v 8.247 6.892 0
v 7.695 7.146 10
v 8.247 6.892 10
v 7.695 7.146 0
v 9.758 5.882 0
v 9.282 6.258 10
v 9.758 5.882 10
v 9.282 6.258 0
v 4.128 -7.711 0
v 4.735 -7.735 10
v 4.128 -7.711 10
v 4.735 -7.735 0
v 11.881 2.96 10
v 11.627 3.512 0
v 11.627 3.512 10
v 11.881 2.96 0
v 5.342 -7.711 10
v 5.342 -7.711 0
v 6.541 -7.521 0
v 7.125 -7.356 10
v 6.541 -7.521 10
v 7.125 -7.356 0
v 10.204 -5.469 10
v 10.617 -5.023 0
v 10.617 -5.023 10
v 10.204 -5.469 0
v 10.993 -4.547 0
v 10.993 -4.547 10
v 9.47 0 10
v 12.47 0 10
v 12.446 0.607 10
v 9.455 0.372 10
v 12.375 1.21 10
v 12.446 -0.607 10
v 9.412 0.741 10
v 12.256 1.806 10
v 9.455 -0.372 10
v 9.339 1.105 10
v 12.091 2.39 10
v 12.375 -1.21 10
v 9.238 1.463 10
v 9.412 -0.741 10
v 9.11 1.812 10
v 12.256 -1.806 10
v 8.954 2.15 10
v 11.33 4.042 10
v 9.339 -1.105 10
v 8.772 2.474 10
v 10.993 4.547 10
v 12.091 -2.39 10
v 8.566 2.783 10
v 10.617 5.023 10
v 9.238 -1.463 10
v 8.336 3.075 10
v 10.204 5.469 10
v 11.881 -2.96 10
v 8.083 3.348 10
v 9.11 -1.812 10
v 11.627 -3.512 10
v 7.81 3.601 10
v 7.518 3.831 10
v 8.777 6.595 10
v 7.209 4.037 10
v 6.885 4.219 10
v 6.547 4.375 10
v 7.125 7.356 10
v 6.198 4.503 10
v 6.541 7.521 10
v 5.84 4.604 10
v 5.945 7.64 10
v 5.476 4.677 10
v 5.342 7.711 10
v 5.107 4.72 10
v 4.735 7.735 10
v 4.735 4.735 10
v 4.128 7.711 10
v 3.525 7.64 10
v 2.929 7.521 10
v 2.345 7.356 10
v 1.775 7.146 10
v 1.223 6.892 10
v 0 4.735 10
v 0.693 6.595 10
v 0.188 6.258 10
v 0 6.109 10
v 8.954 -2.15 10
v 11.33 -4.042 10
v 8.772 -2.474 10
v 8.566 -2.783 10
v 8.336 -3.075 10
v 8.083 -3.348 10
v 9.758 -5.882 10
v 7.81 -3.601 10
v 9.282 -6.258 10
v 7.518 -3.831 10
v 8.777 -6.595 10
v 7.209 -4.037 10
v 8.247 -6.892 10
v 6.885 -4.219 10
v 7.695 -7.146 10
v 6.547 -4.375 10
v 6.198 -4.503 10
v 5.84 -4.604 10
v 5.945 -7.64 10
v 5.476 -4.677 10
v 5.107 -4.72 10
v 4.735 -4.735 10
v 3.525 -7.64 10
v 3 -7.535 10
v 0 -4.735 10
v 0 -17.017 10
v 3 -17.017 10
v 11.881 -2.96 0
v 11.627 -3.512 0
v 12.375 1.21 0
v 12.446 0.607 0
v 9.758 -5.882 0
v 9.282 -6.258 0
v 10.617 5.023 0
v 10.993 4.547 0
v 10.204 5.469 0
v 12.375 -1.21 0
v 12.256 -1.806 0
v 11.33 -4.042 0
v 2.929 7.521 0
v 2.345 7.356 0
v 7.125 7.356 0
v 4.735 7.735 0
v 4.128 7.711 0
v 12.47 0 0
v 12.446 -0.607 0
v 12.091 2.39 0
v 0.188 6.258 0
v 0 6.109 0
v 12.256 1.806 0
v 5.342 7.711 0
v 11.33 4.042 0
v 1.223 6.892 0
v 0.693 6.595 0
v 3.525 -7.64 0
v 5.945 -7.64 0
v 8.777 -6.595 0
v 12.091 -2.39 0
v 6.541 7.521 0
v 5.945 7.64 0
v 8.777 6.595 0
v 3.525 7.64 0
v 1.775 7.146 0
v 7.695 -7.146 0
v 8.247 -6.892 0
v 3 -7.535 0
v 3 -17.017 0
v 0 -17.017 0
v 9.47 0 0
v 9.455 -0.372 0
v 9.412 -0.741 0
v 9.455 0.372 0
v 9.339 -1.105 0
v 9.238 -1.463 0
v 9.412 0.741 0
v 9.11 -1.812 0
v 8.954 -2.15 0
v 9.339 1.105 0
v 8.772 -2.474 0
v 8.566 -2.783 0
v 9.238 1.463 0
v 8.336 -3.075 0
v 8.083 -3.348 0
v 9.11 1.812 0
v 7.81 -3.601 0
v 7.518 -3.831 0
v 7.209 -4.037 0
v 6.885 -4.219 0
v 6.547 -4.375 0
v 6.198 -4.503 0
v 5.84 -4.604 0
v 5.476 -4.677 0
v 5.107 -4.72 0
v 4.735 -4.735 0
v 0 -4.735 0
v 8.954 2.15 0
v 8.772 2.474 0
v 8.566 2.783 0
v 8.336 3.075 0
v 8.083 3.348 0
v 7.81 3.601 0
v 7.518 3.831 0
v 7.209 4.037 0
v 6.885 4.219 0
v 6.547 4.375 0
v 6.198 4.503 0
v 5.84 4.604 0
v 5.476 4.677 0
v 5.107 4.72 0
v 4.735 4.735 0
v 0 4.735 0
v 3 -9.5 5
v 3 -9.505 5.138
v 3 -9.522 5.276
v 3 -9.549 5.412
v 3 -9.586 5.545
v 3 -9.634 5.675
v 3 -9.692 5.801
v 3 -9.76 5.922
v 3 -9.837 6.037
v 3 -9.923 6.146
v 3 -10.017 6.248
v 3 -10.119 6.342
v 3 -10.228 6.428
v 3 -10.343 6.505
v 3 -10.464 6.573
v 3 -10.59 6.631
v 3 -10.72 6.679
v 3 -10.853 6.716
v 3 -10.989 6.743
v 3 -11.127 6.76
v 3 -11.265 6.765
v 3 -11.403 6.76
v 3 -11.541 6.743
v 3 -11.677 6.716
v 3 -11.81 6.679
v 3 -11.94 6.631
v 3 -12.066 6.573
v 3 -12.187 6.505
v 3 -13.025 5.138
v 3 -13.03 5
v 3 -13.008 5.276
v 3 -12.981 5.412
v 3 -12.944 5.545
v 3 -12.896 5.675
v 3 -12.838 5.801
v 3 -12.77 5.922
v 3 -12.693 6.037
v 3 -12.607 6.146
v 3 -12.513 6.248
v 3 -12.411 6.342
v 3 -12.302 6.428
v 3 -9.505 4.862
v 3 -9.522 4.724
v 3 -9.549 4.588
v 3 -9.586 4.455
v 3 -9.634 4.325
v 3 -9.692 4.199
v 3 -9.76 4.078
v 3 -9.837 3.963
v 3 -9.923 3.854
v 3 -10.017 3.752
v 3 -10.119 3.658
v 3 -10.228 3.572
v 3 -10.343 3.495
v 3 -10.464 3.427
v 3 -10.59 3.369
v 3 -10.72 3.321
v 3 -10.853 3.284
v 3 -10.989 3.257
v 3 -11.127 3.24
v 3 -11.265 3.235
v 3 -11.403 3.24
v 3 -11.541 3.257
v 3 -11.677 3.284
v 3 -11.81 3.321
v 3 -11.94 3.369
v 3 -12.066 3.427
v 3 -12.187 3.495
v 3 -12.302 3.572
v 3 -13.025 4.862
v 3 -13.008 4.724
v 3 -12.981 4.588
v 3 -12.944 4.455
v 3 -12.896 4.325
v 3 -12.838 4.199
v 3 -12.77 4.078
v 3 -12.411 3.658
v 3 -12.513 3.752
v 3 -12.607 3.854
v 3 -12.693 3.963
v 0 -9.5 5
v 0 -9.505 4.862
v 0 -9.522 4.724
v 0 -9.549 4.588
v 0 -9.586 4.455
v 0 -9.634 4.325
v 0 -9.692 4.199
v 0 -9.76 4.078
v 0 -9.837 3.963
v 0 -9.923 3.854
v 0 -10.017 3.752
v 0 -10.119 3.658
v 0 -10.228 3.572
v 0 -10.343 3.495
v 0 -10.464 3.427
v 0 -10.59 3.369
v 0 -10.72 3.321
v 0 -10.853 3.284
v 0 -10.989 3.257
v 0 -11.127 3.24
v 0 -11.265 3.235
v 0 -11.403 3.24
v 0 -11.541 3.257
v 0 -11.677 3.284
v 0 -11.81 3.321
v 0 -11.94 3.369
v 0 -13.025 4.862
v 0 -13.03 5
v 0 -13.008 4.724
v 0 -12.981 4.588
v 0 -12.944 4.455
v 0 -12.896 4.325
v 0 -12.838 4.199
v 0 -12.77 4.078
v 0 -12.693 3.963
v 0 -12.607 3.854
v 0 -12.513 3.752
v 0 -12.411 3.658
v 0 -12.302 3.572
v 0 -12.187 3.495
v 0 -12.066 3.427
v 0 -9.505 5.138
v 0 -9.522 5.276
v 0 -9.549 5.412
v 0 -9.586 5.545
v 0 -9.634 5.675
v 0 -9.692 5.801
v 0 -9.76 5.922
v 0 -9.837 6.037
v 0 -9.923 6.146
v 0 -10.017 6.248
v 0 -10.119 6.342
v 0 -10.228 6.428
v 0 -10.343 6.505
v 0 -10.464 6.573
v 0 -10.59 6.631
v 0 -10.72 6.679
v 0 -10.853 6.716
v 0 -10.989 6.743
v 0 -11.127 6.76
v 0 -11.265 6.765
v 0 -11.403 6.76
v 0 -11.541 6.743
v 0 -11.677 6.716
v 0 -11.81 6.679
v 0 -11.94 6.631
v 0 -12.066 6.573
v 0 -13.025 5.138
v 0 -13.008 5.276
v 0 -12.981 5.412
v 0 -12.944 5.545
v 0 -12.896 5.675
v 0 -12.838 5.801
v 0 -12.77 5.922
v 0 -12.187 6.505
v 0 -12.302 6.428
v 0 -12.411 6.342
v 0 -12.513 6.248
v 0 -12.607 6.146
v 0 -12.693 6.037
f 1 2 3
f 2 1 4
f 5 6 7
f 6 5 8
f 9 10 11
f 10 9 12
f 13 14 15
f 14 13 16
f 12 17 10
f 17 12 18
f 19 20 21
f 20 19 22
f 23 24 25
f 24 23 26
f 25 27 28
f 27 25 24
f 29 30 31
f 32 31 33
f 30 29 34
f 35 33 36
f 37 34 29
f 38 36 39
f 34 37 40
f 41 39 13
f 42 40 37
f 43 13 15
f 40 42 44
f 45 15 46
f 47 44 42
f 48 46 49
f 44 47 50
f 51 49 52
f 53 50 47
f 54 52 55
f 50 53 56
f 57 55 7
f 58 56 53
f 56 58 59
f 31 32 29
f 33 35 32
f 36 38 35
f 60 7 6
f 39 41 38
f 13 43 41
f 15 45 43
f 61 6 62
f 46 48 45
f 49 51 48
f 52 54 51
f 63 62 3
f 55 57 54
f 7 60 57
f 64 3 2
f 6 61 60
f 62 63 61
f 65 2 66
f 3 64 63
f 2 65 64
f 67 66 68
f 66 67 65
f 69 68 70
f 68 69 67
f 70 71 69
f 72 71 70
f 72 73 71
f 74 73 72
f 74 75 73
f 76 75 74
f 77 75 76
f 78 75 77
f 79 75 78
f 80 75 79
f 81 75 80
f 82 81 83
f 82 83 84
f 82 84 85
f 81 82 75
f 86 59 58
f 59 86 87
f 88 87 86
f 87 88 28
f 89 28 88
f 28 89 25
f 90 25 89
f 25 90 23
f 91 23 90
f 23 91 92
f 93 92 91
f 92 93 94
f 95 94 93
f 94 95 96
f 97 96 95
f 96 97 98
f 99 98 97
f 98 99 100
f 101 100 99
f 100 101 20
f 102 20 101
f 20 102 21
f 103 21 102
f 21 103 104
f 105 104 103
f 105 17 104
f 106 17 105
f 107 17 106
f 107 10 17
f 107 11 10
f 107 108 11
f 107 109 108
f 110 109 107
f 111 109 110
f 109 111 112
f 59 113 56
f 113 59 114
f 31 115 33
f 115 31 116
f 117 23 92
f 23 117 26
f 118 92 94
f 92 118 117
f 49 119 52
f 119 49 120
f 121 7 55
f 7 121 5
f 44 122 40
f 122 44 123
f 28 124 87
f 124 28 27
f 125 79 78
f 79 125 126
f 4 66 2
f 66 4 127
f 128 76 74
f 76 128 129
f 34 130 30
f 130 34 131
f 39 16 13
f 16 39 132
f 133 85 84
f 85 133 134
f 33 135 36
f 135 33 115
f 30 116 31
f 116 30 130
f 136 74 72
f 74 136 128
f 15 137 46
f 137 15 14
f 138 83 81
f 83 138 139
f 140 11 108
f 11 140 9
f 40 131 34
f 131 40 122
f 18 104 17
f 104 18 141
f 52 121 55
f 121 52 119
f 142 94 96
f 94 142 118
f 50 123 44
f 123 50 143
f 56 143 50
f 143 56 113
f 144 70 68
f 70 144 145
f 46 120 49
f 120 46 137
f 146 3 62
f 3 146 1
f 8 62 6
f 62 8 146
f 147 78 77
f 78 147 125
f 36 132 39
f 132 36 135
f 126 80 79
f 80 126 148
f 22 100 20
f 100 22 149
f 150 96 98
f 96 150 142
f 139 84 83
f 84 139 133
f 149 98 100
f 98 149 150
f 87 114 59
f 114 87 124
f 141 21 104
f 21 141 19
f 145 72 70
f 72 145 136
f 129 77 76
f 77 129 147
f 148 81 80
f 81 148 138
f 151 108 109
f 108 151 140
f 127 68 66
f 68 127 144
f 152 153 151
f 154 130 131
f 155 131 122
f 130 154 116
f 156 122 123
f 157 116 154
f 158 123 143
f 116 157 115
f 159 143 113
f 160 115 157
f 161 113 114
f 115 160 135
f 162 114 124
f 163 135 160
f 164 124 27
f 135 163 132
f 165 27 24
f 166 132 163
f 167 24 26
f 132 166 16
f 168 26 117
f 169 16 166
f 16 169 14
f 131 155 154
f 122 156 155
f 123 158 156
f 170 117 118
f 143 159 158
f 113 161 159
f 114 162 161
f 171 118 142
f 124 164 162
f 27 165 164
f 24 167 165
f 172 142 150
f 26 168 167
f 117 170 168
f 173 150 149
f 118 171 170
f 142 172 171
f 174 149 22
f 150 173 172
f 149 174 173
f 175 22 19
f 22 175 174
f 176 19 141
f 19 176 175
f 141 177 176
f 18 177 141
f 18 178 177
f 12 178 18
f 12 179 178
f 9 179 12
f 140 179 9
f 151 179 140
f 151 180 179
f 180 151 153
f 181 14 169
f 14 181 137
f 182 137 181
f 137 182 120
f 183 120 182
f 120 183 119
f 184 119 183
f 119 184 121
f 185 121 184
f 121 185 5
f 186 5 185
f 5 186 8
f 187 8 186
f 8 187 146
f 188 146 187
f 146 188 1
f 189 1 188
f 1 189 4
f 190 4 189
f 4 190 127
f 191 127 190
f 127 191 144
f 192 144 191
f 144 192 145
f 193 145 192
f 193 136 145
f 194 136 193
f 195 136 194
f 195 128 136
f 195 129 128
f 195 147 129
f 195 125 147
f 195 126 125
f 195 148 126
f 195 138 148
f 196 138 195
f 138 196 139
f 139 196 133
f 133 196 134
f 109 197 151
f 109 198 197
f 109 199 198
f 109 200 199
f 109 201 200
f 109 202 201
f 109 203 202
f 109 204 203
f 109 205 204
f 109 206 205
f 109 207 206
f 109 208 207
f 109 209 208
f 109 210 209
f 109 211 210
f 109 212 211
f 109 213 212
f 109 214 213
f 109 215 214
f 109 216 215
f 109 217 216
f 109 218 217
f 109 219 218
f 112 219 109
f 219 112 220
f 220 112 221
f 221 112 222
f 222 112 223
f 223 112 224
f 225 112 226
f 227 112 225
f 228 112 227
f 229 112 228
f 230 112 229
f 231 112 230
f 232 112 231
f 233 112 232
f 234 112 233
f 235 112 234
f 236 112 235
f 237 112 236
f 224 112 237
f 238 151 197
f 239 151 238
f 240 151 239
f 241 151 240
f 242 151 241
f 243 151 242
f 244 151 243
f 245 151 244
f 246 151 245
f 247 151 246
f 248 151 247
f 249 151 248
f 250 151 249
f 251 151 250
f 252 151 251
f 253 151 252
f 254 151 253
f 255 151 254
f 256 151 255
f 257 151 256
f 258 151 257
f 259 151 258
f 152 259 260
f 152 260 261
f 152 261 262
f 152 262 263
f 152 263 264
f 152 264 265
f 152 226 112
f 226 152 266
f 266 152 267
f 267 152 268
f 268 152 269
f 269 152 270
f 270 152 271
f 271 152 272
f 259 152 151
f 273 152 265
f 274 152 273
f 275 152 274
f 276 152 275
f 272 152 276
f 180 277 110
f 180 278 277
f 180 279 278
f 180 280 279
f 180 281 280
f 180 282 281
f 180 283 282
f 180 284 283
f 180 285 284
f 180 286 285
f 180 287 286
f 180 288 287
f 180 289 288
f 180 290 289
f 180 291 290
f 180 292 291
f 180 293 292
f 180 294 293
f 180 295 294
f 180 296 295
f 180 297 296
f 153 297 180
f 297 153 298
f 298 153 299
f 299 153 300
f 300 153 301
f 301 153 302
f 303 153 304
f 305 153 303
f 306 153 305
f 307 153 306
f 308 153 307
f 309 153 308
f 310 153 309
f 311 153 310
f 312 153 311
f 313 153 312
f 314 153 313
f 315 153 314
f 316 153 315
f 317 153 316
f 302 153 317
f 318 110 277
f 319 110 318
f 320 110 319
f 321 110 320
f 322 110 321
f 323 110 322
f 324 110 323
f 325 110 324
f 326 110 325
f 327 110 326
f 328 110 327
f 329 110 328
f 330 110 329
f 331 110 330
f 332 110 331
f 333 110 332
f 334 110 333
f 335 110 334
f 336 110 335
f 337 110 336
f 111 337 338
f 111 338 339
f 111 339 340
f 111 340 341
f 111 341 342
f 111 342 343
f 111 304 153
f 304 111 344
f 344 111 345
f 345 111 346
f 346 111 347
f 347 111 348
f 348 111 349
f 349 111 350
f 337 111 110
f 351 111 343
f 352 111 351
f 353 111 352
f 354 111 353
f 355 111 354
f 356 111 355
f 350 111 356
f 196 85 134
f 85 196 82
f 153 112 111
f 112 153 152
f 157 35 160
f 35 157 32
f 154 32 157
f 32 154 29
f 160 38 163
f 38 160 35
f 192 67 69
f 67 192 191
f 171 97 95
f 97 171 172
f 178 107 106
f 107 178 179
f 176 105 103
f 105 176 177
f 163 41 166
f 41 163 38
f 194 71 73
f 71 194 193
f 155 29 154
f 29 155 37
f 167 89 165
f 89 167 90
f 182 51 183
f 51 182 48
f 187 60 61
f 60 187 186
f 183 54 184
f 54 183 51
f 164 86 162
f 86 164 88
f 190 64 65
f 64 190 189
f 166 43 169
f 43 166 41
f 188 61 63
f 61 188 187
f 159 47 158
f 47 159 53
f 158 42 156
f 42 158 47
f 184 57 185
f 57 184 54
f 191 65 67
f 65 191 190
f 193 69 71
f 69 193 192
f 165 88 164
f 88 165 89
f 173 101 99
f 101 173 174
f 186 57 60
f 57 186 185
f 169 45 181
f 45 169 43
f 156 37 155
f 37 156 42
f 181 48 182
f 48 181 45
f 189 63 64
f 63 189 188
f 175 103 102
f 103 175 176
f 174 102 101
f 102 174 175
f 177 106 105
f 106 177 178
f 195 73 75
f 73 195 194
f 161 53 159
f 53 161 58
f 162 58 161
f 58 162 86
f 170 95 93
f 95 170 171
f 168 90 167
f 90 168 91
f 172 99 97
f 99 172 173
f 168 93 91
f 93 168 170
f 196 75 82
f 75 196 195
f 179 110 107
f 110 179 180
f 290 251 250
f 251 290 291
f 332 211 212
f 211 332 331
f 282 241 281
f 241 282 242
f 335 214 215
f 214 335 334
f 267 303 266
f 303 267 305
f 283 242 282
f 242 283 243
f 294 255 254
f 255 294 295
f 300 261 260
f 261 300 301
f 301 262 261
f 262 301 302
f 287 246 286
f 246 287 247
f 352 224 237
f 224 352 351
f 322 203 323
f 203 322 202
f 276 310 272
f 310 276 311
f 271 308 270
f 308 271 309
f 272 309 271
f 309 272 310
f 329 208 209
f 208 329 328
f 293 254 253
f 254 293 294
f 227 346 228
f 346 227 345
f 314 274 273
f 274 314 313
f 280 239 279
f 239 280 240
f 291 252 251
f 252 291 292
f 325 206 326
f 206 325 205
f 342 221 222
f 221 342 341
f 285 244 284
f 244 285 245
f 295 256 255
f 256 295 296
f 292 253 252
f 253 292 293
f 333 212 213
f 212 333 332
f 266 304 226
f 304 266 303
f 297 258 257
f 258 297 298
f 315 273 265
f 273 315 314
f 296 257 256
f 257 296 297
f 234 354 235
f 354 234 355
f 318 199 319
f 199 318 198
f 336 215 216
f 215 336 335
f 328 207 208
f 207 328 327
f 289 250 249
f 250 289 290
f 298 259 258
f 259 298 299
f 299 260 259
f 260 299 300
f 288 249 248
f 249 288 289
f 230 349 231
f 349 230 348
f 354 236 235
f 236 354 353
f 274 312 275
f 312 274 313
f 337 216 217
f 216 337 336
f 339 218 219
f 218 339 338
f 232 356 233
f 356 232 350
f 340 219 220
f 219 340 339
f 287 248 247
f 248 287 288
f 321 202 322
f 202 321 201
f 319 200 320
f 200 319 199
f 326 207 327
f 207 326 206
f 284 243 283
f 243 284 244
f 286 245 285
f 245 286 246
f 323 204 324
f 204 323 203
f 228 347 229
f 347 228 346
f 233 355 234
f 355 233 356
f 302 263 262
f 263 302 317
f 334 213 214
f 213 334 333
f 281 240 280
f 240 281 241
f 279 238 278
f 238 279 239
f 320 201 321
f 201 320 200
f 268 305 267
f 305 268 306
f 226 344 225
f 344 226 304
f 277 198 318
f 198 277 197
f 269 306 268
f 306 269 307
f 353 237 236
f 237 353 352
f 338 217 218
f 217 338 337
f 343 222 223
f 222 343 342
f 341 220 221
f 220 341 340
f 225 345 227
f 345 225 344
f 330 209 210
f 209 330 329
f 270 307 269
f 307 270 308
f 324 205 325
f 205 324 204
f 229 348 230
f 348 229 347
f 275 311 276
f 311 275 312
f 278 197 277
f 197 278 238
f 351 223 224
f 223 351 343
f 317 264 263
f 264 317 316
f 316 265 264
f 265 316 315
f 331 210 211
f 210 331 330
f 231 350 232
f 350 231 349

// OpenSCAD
// ==============================================
// Clamp for 9 mm diameter cable
// J.Beale 12-Sept-2015
// ==============================================
fudge = 0.25;  // fudge factor for printer slop in ID
fn=80;  // facets on cylinder
eps=0.03; // small number
bn = 100; // big number

// ==============================================
//  Commonly adjusted parameters

COD = 9.22;      // outer diameter of cable
ID = 3.5 + eps;  // diameter of mounting hole
th = 3.0;        // thickness of clamp
W = 10.0;  // width of clamp

// ==============================================

// --- Shouldn't need to adjust this part ---

R1 = (COD + fudge)/2;  // radius of cable
R2 = R1 + th;  // radius of curved part of clamp
L = R2 * 2.2; // length of flat base part of clamp

// ----------------------------------

module mt_hole() {  // mounting hole
  translate([-W,-R2-(ID),W/2]) rotate([0,90,0]) cylinder(d=ID, h=W*3, $fn=fn);
}


module cable() {
  translate([R1,0,-W]) 
    cylinder(r=R1, h=W*3, $fn=fn);  // cylinder to clamp
}

module flatClamp() {
 difference() {    
  union() {
    translate([R1,0,0]) 
      cylinder(r=R2, h=W, $fn=fn);  // cylinder part of clamp
    translate([0,-L,0]) cube([th,L,W]); // flat part of clamp
  }
  cable();
  translate([-bn,-bn/2,-bn/2]) cube([bn,bn,bn]);  // trim base flat
  translate([-R1,-R1,-eps]) cube([R1*2,R1*2,W+2*eps]);  // open cylinder
  mt_hole(); // mounting hole
 }
}

module cornerClamp() {
 difference() {
  translate([0,-R1,0]) flatClamp();
  translate([-eps,-eps,-eps]) cube([100,100,100]);
  translate([-eps,-120,-eps]) cube([100,100,100]);
 }
}

// cornerClamp();  // cable clamp against a 90 degree corner

flatClamp();  // cable clamp for a flat surface
